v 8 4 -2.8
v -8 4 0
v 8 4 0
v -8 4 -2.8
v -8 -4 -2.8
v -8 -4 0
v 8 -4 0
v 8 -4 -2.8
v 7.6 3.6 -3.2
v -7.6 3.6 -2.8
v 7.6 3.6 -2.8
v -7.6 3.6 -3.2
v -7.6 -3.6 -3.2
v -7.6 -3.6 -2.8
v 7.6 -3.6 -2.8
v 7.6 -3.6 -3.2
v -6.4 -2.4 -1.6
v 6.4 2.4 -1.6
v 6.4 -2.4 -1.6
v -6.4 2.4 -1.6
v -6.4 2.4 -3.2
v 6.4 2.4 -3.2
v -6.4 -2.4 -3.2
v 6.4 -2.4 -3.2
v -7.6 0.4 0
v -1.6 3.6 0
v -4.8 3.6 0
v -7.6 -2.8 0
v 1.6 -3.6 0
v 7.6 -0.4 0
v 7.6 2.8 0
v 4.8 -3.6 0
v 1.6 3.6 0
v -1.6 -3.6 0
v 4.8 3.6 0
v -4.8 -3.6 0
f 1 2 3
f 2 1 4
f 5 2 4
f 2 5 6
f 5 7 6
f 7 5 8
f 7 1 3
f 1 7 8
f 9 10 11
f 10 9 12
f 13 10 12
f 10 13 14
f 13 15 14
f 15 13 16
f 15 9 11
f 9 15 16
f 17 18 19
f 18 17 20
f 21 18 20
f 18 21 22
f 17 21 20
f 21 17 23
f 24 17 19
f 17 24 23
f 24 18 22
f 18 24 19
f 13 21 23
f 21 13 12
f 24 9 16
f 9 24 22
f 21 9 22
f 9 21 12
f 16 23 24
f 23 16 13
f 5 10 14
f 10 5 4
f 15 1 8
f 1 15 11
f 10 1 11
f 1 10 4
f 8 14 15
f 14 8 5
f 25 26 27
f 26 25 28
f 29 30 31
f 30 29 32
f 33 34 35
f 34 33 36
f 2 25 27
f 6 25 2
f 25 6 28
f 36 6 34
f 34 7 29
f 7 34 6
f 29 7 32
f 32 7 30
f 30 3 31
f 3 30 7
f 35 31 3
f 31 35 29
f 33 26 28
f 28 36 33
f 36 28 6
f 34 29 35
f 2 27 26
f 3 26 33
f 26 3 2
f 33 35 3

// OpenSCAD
// file: ../p/4-4edge.scad
use <../lib.scad>
$fa=1; $fs=0.2;
function ldraw_lib__4_4edge(realsolid=false) = [
// 0 Circle 1.0
// 0 Name: 4-4edge.dat
// 0 Author: James Jessiman
// 0 !LDRAW_ORG Primitive UPDATE 2017-01
// 0 !LICENSE Licensed under CC BY 2.0 and CC BY 4.0 : see CAreadme.txt
// 
// 0 BFC CERTIFY CCW
  [0,"BFC","CERTIFY"],
  [0,"BFC","CCW"],
// 
// 0 !HISTORY 1998-12-15 [PTadmin] Official Update 1998-10
// 0 !HISTORY 2005-12-28 [PTadmin] Official Update 2005-01
// 0 !HISTORY 2007-06-24 [PTadmin] Header formatted for Contributor Agreement
// 0 !HISTORY 2008-07-01 [PTadmin] Official Update 2008-01
// 0 !HISTORY 2017-01-15 [Steffen] BFCed
// 0 !HISTORY 2017-12-30 [PTadmin] Official Update 2017-01
// 
// 
// 2 24 1 0 0 0.9239 0 0.3827
  [2,24,1,0,0,0.9239,0,0.3827],
// 2 24 0.9239 0 0.3827 0.7071 0 0.7071
  [2,24,0.9239,0,0.3827,0.7071,0,0.7071],
// 2 24 0.7071 0 0.7071 0.3827 0 0.9239
  [2,24,0.7071,0,0.7071,0.3827,0,0.9239],
// 2 24 0.3827 0 0.9239 0 0 1
  [2,24,0.3827,0,0.9239,0,0,1],
// 2 24 0 0 1 -0.3827 0 0.9239
  [2,24,0,0,1,-0.3827,0,0.9239],
// 2 24 -0.3827 0 0.9239 -0.7071 0 0.7071
  [2,24,-0.3827,0,0.9239,-0.7071,0,0.7071],
// 2 24 -0.7071 0 0.7071 -0.9239 0 0.3827
  [2,24,-0.7071,0,0.7071,-0.9239,0,0.3827],
// 2 24 -0.9239 0 0.3827 -1 0 -0
  [2,24,-0.9239,0,0.3827,-1,0,-0],
// 2 24 -1 0 -0 -0.9239 0 -0.3827
  [2,24,-1,0,-0,-0.9239,0,-0.3827],
// 2 24 -0.9239 0 -0.3827 -0.7071 0 -0.7071
  [2,24,-0.9239,0,-0.3827,-0.7071,0,-0.7071],
// 2 24 -0.7071 0 -0.7071 -0.3827 0 -0.9239
  [2,24,-0.7071,0,-0.7071,-0.3827,0,-0.9239],
// 2 24 -0.3827 0 -0.9239 0 0 -1
  [2,24,-0.3827,0,-0.9239,0,0,-1],
// 2 24 0 0 -1 0.3827 0 -0.9239
  [2,24,0,0,-1,0.3827,0,-0.9239],
// 2 24 0.3827 0 -0.9239 0.7071 0 -0.7071
  [2,24,0.3827,0,-0.9239,0.7071,0,-0.7071],
// 2 24 0.7071 0 -0.7071 0.9239 0 -0.3827
  [2,24,0.7071,0,-0.7071,0.9239,0,-0.3827],
// 2 24 0.9239 0 -0.3827 1 0 0
  [2,24,0.9239,0,-0.3827,1,0,0],
];
module ldraw_lib__4_4edge(step=0, col=false, unit=2/5, alt=false, line=0.2, solid=!$preview)
    makepoly(ldraw_lib__4_4edge(solid), step=step, col=col, unit=unit, alt=alt, line=line, solid=solid);
ldraw_lib__4_4edge(line=0.2);
// file: ../p/4-4disc.scad
use <../lib.scad>
$fa=1; $fs=0.2;
function ldraw_lib__4_4disc(realsolid=false) = [
// 0 Disc 1.0
// 0 Name: 4-4disc.dat
// 0 Author: James Jessiman
// 0 !LDRAW_ORG Primitive UPDATE 2002-02
// 0 !LICENSE Licensed under CC BY 2.0 and CC BY 4.0 : see CAreadme.txt
// 
// 0 BFC CERTIFY CCW
  [0,"BFC","CERTIFY"],
  [0,"BFC","CCW"],
// 
// 0 !HISTORY 1998-12-15 [PTadmin] Official Update 1998-10
// 0 !HISTORY 2002-03-23 [sbliss] Added BFC statement
// 0 !HISTORY 2002-04-25 [PTadmin] Official Update 2002-02
// 0 !HISTORY 2007-06-24 [PTadmin] Header formatted for Contributor Agreement
// 0 !HISTORY 2008-07-01 [PTadmin] Official Update 2008-01
// 
// 
// 3 16 0 0 0 1 0 0 0.9239 0 0.3827
  [3,16,0,0,0,1,0,0,0.9239,0,0.3827],
// 3 16 0 0 0 0.9239 0 0.3827 0.7071 0 0.7071
  [3,16,0,0,0,0.9239,0,0.3827,0.7071,0,0.7071],
// 3 16 0 0 0 0.7071 0 0.7071 0.3827 0 0.9239
  [3,16,0,0,0,0.7071,0,0.7071,0.3827,0,0.9239],
// 3 16 0 0 0 0.3827 0 0.9239 0 0 1
  [3,16,0,0,0,0.3827,0,0.9239,0,0,1],
// 3 16 0 0 0 0 0 1 -0.3827 0 0.9239
  [3,16,0,0,0,0,0,1,-0.3827,0,0.9239],
// 3 16 0 0 0 -0.3827 0 0.9239 -0.7071 0 0.7071
  [3,16,0,0,0,-0.3827,0,0.9239,-0.7071,0,0.7071],
// 3 16 0 0 0 -0.7071 0 0.7071 -0.9239 0 0.3827
  [3,16,0,0,0,-0.7071,0,0.7071,-0.9239,0,0.3827],
// 3 16 0 0 0 -0.9239 0 0.3827 -1 0 -0
  [3,16,0,0,0,-0.9239,0,0.3827,-1,0,-0],
// 3 16 0 0 0 -1 0 -0 -0.9239 0 -0.3827
  [3,16,0,0,0,-1,0,-0,-0.9239,0,-0.3827],
// 3 16 0 0 0 -0.9239 0 -0.3827 -0.7071 0 -0.7071
  [3,16,0,0,0,-0.9239,0,-0.3827,-0.7071,0,-0.7071],
// 3 16 0 0 0 -0.7071 0 -0.7071 -0.3827 0 -0.9239
  [3,16,0,0,0,-0.7071,0,-0.7071,-0.3827,0,-0.9239],
// 3 16 0 0 0 -0.3827 0 -0.9239 0 0 -1
  [3,16,0,0,0,-0.3827,0,-0.9239,0,0,-1],
// 3 16 0 0 0 0 0 -1 0.3827 0 -0.9239
  [3,16,0,0,0,0,0,-1,0.3827,0,-0.9239],
// 3 16 0 0 0 0.3827 0 -0.9239 0.7071 0 -0.7071
  [3,16,0,0,0,0.3827,0,-0.9239,0.7071,0,-0.7071],
// 3 16 0 0 0 0.7071 0 -0.7071 0.9239 0 -0.3827
  [3,16,0,0,0,0.7071,0,-0.7071,0.9239,0,-0.3827],
// 3 16 0 0 0 0.9239 0 -0.3827 1 0 0
  [3,16,0,0,0,0.9239,0,-0.3827,1,0,0],
// 0
];
module ldraw_lib__4_4disc(step=0, col=false, unit=2/5, alt=false, line=0.2, solid=!$preview)
    makepoly(ldraw_lib__4_4disc(solid), step=step, col=col, unit=unit, alt=alt, line=line, solid=solid);
ldraw_lib__4_4disc(line=0.2);
// file: ../p/4-4cyli.scad
use <../lib.scad>
$fa=1; $fs=0.2;
function ldraw_lib__4_4cyli(realsolid=false) = [
// 0 Cylinder 1.0
// 0 Name: 4-4cyli.dat
// 0 Author: James Jessiman
// 0 !LDRAW_ORG Primitive UPDATE 2005-01
// 0 !LICENSE Licensed under CC BY 2.0 and CC BY 4.0 : see CAreadme.txt
// 
// 0 BFC CERTIFY CCW
  [0,"BFC","CERTIFY"],
  [0,"BFC","CCW"],
// 
// 0 !HISTORY 1998-12-15 [PTadmin] Official Update 1998-10
// 0 !HISTORY 2002-03-23 [sbliss] Added BFC statement; merged headers from files in distributions LDraw 0.27 and Complete.
// 0 !HISTORY 2002-04-25 [PTadmin] Official Update 2002-02
// 0 !HISTORY 2004-12-14 [guyvivan] BFC CCW
// 0 !HISTORY 2005-12-28 [PTadmin] Official Update 2005-01
// 0 !HISTORY 2007-06-24 [PTadmin] Header formatted for Contributor Agreement
// 0 !HISTORY 2008-07-01 [PTadmin] Official Update 2008-01
// 
// 
// 4 16 1 1 0 0.9239 1 0.3827 0.9239 0 0.3827 1 0 0
  [4,16,1,1,0,0.9239,1,0.3827,0.9239,0,0.3827,1,0,0],
// 5 24 1 0 0 1 1 0 0.9239 0 0.3827 0.9239 0 -0.3827
  [5,24,1,0,0,1,1,0,0.9239,0,0.3827,0.9239,0,-0.3827],
// 4 16 0.9239 1 0.3827 0.7071 1 0.7071 0.7071 0 0.7071 0.9239 0 0.3827
  [4,16,0.9239,1,0.3827,0.7071,1,0.7071,0.7071,0,0.7071,0.9239,0,0.3827],
// 5 24 0.9239 0 0.3827 0.9239 1 0.3827 0.7071 0 0.7071 1 0 0
  [5,24,0.9239,0,0.3827,0.9239,1,0.3827,0.7071,0,0.7071,1,0,0],
// 4 16 0.7071 1 0.7071 0.3827 1 0.9239 0.3827 0 0.9239 0.7071 0 0.7071
  [4,16,0.7071,1,0.7071,0.3827,1,0.9239,0.3827,0,0.9239,0.7071,0,0.7071],
// 5 24 0.7071 0 0.7071 0.7071 1 0.7071 0.3827 0 0.9239 0.9239 0 0.3827
  [5,24,0.7071,0,0.7071,0.7071,1,0.7071,0.3827,0,0.9239,0.9239,0,0.3827],
// 4 16 0.3827 1 0.9239 0 1 1 0 0 1 0.3827 0 0.9239
  [4,16,0.3827,1,0.9239,0,1,1,0,0,1,0.3827,0,0.9239],
// 5 24 0.3827 0 0.9239 0.3827 1 0.9239 0 0 1 0.7071 0 0.7071
  [5,24,0.3827,0,0.9239,0.3827,1,0.9239,0,0,1,0.7071,0,0.7071],
// 4 16 0 1 1 -0.3827 1 0.9239 -0.3827 0 0.9239 0 0 1
  [4,16,0,1,1,-0.3827,1,0.9239,-0.3827,0,0.9239,0,0,1],
// 5 24 0 0 1 0 1 1 -0.3827 0 0.9239 0.3827 0 0.9239
  [5,24,0,0,1,0,1,1,-0.3827,0,0.9239,0.3827,0,0.9239],
// 4 16 -0.3827 1 0.9239 -0.7071 1 0.7071 -0.7071 0 0.7071 -0.3827 0 0.9239
  [4,16,-0.3827,1,0.9239,-0.7071,1,0.7071,-0.7071,0,0.7071,-0.3827,0,0.9239],
// 5 24 -0.3827 0 0.9239 -0.3827 1 0.9239 -0.7071 0 0.7071 0 0 1
  [5,24,-0.3827,0,0.9239,-0.3827,1,0.9239,-0.7071,0,0.7071,0,0,1],
// 4 16 -0.7071 1 0.7071 -0.9239 1 0.3827 -0.9239 0 0.3827 -0.7071 0 0.7071
  [4,16,-0.7071,1,0.7071,-0.9239,1,0.3827,-0.9239,0,0.3827,-0.7071,0,0.7071],
// 5 24 -0.7071 0 0.7071 -0.7071 1 0.7071 -0.9239 0 0.3827 -0.3827 0 0.9239
  [5,24,-0.7071,0,0.7071,-0.7071,1,0.7071,-0.9239,0,0.3827,-0.3827,0,0.9239],
// 4 16 -0.9239 1 0.3827 -1 1 0 -1 0 0 -0.9239 0 0.3827
  [4,16,-0.9239,1,0.3827,-1,1,0,-1,0,0,-0.9239,0,0.3827],
// 5 24 -0.9239 0 0.3827 -0.9239 1 0.3827 -1 0 0 -0.7071 0 0.7071
  [5,24,-0.9239,0,0.3827,-0.9239,1,0.3827,-1,0,0,-0.7071,0,0.7071],
// 4 16 -1 1 0 -0.9239 1 -0.3827 -0.9239 0 -0.3827 -1 0 0
  [4,16,-1,1,0,-0.9239,1,-0.3827,-0.9239,0,-0.3827,-1,0,0],
// 5 24 -1 0 0 -1 1 0 -0.9239 0 -0.3827 -0.9239 0 0.3827
  [5,24,-1,0,0,-1,1,0,-0.9239,0,-0.3827,-0.9239,0,0.3827],
// 4 16 -0.9239 1 -0.3827 -0.7071 1 -0.7071 -0.7071 0 -0.7071 -0.9239 0 -0.3827
  [4,16,-0.9239,1,-0.3827,-0.7071,1,-0.7071,-0.7071,0,-0.7071,-0.9239,0,-0.3827],
// 5 24 -0.9239 0 -0.3827 -0.9239 1 -0.3827 -0.7071 0 -0.7071 -1 0 0
  [5,24,-0.9239,0,-0.3827,-0.9239,1,-0.3827,-0.7071,0,-0.7071,-1,0,0],
// 4 16 -0.7071 1 -0.7071 -0.3827 1 -0.9239 -0.3827 0 -0.9239 -0.7071 0 -0.7071
  [4,16,-0.7071,1,-0.7071,-0.3827,1,-0.9239,-0.3827,0,-0.9239,-0.7071,0,-0.7071],
// 5 24 -0.7071 0 -0.7071 -0.7071 1 -0.7071 -0.3827 0 -0.9239 -0.9239 0 -0.3827
  [5,24,-0.7071,0,-0.7071,-0.7071,1,-0.7071,-0.3827,0,-0.9239,-0.9239,0,-0.3827],
// 4 16 -0.3827 1 -0.9239 0 1 -1 0 0 -1 -0.3827 0 -0.9239
  [4,16,-0.3827,1,-0.9239,0,1,-1,0,0,-1,-0.3827,0,-0.9239],
// 5 24 -0.3827 0 -0.9239 -0.3827 1 -0.9239 0 0 -1 -0.7071 0 -0.7071
  [5,24,-0.3827,0,-0.9239,-0.3827,1,-0.9239,0,0,-1,-0.7071,0,-0.7071],
// 4 16 0 1 -1 0.3827 1 -0.9239 0.3827 0 -0.9239 0 0 -1
  [4,16,0,1,-1,0.3827,1,-0.9239,0.3827,0,-0.9239,0,0,-1],
// 5 24 0 0 -1 0 1 -1 0.3827 0 -0.9239 -0.3827 0 -0.9239
  [5,24,0,0,-1,0,1,-1,0.3827,0,-0.9239,-0.3827,0,-0.9239],
// 4 16 0.3827 1 -0.9239 0.7071 1 -0.7071 0.7071 0 -0.7071 0.3827 0 -0.9239
  [4,16,0.3827,1,-0.9239,0.7071,1,-0.7071,0.7071,0,-0.7071,0.3827,0,-0.9239],
// 5 24 0.3827 0 -0.9239 0.3827 1 -0.9239 0.7071 0 -0.7071 0 0 -1
  [5,24,0.3827,0,-0.9239,0.3827,1,-0.9239,0.7071,0,-0.7071,0,0,-1],
// 4 16 0.7071 1 -0.7071 0.9239 1 -0.3827 0.9239 0 -0.3827 0.7071 0 -0.7071
  [4,16,0.7071,1,-0.7071,0.9239,1,-0.3827,0.9239,0,-0.3827,0.7071,0,-0.7071],
// 5 24 0.7071 0 -0.7071 0.7071 1 -0.7071 0.9239 0 -0.3827 0.3827 0 -0.9239
  [5,24,0.7071,0,-0.7071,0.7071,1,-0.7071,0.9239,0,-0.3827,0.3827,0,-0.9239],
// 4 16 0.9239 1 -0.3827 1 1 0 1 0 0 0.9239 0 -0.3827
  [4,16,0.9239,1,-0.3827,1,1,0,1,0,0,0.9239,0,-0.3827],
// 5 24 0.9239 0 -0.3827 0.9239 1 -0.3827 1 0 0 0.7071 0 -0.7071
  [5,24,0.9239,0,-0.3827,0.9239,1,-0.3827,1,0,0,0.7071,0,-0.7071],
// 0
];
module ldraw_lib__4_4cyli(step=0, col=false, unit=2/5, alt=false, line=0.2, solid=!$preview)
    makepoly(ldraw_lib__4_4cyli(solid), step=step, col=col, unit=unit, alt=alt, line=line, solid=solid);
ldraw_lib__4_4cyli(line=0.2);
// file: ../p/stud3.scad
use <../lib.scad>
use <4-4cyli.scad>
use <4-4disc.scad>
use <4-4edge.scad>
$fa=1; $fs=0.2;
function ldraw_lib__stud3(realsolid=false) = realsolid ? 
    [openscad(translate([0,0,-eps()], o=cylinder(4+eps(), r=4)),2)] : [
// 0 Stud Tube Solid
// 0 Name: stud3.dat
// 0 Author: James Jessiman
// 0 !LDRAW_ORG Primitive UPDATE 2012-01
// 0 !LICENSE Licensed under CC BY 2.0 and CC BY 4.0 : see CAreadme.txt
// 
// 0 BFC CERTIFY CCW
  [0,"BFC","CERTIFY"],
  [0,"BFC","CCW"],
// 
// 0 !HISTORY 2002-04-04 [sbliss] Modified for BFC compliance
// 0 !HISTORY 2002-04-25 [PTadmin] Official Update 2002-02
// 0 !HISTORY 2007-06-24 [PTadmin] Header formatted for Contributor Agreement
// 0 !HISTORY 2008-07-01 [PTadmin] Official Update 2008-01
// 0 !HISTORY 2012-02-16 [Philo] Changed to CCW
// 0 !HISTORY 2012-03-30 [PTadmin] Official Update 2012-01
// 
// 
// 1 16 0 -4 0 4 0 0 0 1 0 0 0 4 4-4edge.dat
  [1,16,0,-4,0,4,0,0,0,1,0,0,0,4, ldraw_lib__4_4edge(realsolid)],
// 1 16 0 0 0 4 0 0 0 1 0 0 0 4 4-4edge.dat
  [1,16,0,0,0,4,0,0,0,1,0,0,0,4, ldraw_lib__4_4edge(realsolid)],
// 1 16 0 -4 0 4 0 0 0 1 0 0 0 4 4-4disc.dat
  [1,16,0,-4,0,4,0,0,0,1,0,0,0,4, ldraw_lib__4_4disc(realsolid)],
// 1 16 0 -4 0 4 0 0 0 4 0 0 0 4 4-4cyli.dat
  [1,16,0,-4,0,4,0,0,0,4,0,0,0,4, ldraw_lib__4_4cyli(realsolid)],
];
module ldraw_lib__stud3(step=0, col=false, unit=2/5, alt=false, line=0.2, solid=!$preview)
    makepoly(ldraw_lib__stud3(solid), step=step, col=col, unit=unit, alt=alt, line=line, solid=solid);
ldraw_lib__stud3(line=0.2);
// file: ../p/stud.scad
use <../lib.scad>
use <4-4cyli.scad>
use <4-4disc.scad>
use <4-4edge.scad>
$fa=1; $fs=0.2;
function ldraw_lib__stud(realsolid=false) = realsolid ? 
    [openscad(translate([0,0,-eps()], o=cylinder(4+eps(), r=6)),2)] : [
// 0 Stud
// 0 Name: stud.dat
// 0 Author: James Jessiman
// 0 !LDRAW_ORG Primitive UPDATE 2012-01
// 0 !LICENSE Licensed under CC BY 2.0 and CC BY 4.0 : see CAreadme.txt
// 
// 0 BFC CERTIFY CCW
  [0,"BFC","CERTIFY"],
  [0,"BFC","CCW"],
// 
// 0 !HISTORY 2002-04-04 [sbliss] Modified for BFC compliance
// 0 !HISTORY 2002-04-25 [PTadmin] Official Update 2002-02
// 0 !HISTORY 2007-06-24 [PTadmin] Header formatted for Contributor Agreement
// 0 !HISTORY 2008-07-01 [PTadmin] Official Update 2008-01
// 0 !HISTORY 2012-02-16 [Philo] Changed to CCW
// 0 !HISTORY 2012-03-30 [PTadmin] Official Update 2012-01
// 
// 
// 1 16 0 0 0 6 0 0 0 1 0 0 0 6 4-4edge.dat
  [1,16,0,0,0,6,0,0,0,1,0,0,0,6, ldraw_lib__4_4edge(realsolid)],
// 1 16 0 -4 0 6 0 0 0 1 0 0 0 6 4-4edge.dat
  [1,16,0,-4,0,6,0,0,0,1,0,0,0,6, ldraw_lib__4_4edge(realsolid)],
// 1 16 0 0 0 6 0 0 0 -4 0 0 0 6 4-4cyli.dat
  [1,16,0,0,0,6,0,0,0,-4,0,0,0,6, ldraw_lib__4_4cyli(realsolid)],
// 1 16 0 -4 0 6 0 0 0 1 0 0 0 6 4-4disc.dat
  [1,16,0,-4,0,6,0,0,0,1,0,0,0,6, ldraw_lib__4_4disc(realsolid)],
];
module ldraw_lib__stud(step=0, col=false, unit=2/5, alt=false, line=0.2, solid=!$preview)
    makepoly(ldraw_lib__stud(solid), step=step, col=col, unit=unit, alt=alt, line=line, solid=solid);
ldraw_lib__stud(line=0.2);
// file: ../p/box4t.scad
use <../lib.scad>
$fa=1; $fs=0.2;
function ldraw_lib__box4t(realsolid=false) = [
// 0 Box with 4 Adjacent Faces and All Edges
// 0 Name: box4t.dat
// 0 Author: Tore Eriksson [Tore_Eriksson]
// 0 !LDRAW_ORG Primitive UPDATE 2003-02
// 0 !LICENSE Licensed under CC BY 2.0 and CC BY 4.0 : see CAreadme.txt
// 
// 0 BFC CERTIFY CCW
  [0,"BFC","CERTIFY"],
  [0,"BFC","CCW"],
// 
// 0 !HISTORY 1997-09-29 [PTadmin] Official Update 1997-15
// 0 !HISTORY 2002-08-31 [izanette] Modified with WINDZ for BFC compliance
// 0 !HISTORY 2003-08-01 [PTadmin] Official Update 2003-02
// 0 !HISTORY 2007-06-24 [PTadmin] Header formatted for Contributor Agreement
// 0 !HISTORY 2008-07-01 [PTadmin] Official Update 2008-01
// 
// 
// 2 24 1 1 1 -1 1 1
  [2,24,1,1,1,-1,1,1],
// 2 24 -1 1 1 -1 1 -1
  [2,24,-1,1,1,-1,1,-1],
// 2 24 -1 1 -1 1 1 -1
  [2,24,-1,1,-1,1,1,-1],
// 2 24 1 1 -1 1 1 1
  [2,24,1,1,-1,1,1,1],
// 2 24 1 0 1 -1 0 1
  [2,24,1,0,1,-1,0,1],
// 2 24 -1 0 1 -1 0 -1
  [2,24,-1,0,1,-1,0,-1],
// 2 24 -1 0 -1 1 0 -1
  [2,24,-1,0,-1,1,0,-1],
// 2 24 1 0 -1 1 0 1
  [2,24,1,0,-1,1,0,1],
// 2 24 1 0 1 1 1 1
  [2,24,1,0,1,1,1,1],
// 2 24 -1 0 1 -1 1 1
  [2,24,-1,0,1,-1,1,1],
// 2 24 1 0 -1 1 1 -1
  [2,24,1,0,-1,1,1,-1],
// 2 24 -1 0 -1 -1 1 -1
  [2,24,-1,0,-1,-1,1,-1],
// 4 16 1 1 1 1 1 -1 -1 1 -1 -1 1 1
  [4,16,1,1,1,1,1,-1,-1,1,-1,-1,1,1],
// 4 16 1 1 1 -1 1 1 -1 0 1 1 0 1
  [4,16,1,1,1,-1,1,1,-1,0,1,1,0,1],
// 4 16 -1 1 1 -1 1 -1 -1 0 -1 -1 0 1
  [4,16,-1,1,1,-1,1,-1,-1,0,-1,-1,0,1],
// 0 4 16 -1 1 -1 -1 0 -1 1 0 -1 1 1 -1
// 4 16 1 1 -1 1 1 1 1 0 1 1 0 -1
  [4,16,1,1,-1,1,1,1,1,0,1,1,0,-1],
// 0
];
module ldraw_lib__box4t(step=0, col=false, unit=2/5, alt=false, line=0.2, solid=!$preview)
    makepoly(ldraw_lib__box4t(solid), step=step, col=col, unit=unit, alt=alt, line=line, solid=solid);
ldraw_lib__box4t(line=0.2);
// file: s/3004s01.scad
use <../../lib.scad>
use <../../p/box4t.scad>
use <../../p/box5.scad>
use <../../p/stud.scad>
use <../../p/stud3.scad>
$fa=1; $fs=0.2;
function ldraw_lib__s__3004s01(realsolid=false) = [
// 0 ~Brick  1 x  2 without Front Face
// 0 Name: s\3004s01.dat
// 0 Author: James Jessiman
// 0 !LDRAW_ORG Subpart UPDATE 2003-03
// 0 !LICENSE Licensed under CC BY 2.0 and CC BY 4.0 : see CAreadme.txt
// 
// 0 BFC CERTIFY CCW
  [0,"BFC","CERTIFY"],
  [0,"BFC","CCW"],
// 
// 0 !HISTORY 2003-09-07 [jriley] Subfiling, BFC
// 0 !HISTORY 2003-12-19 [PTadmin] Official Update 2003-03
// 0 !HISTORY 2007-08-29 [PTadmin] Header formatted for Contributor Agreement
// 0 !HISTORY 2008-07-01 [PTadmin] Official Update 2008-01
// 
// 
// 1 16 0 4 0 1 0 0 0 -5 0 0 0 1 stud3.dat
  [1,16,0,4,0,1,0,0,0,-5,0,0,0,1, ldraw_lib__stud3(realsolid)],
// 0 BFC INVERTNEXT
  [0,"BFC","INVERTNEXT"],
// 1 16 0 24 0 16 0 0 0 -20 0 0 0 6 box5.dat
  [1,16,0,24,0,16,0,0,0,-20,0,0,0,6, ldraw_lib__box5(realsolid)],
// 4 16 20 24 10 16 24 6 -16 24 6 -20 24 10
  [4,16,20,24,10,16,24,6,-16,24,6,-20,24,10],
// 4 16 -20 24 10 -16 24 6 -16 24 -6 -20 24 -10
  [4,16,-20,24,10,-16,24,6,-16,24,-6,-20,24,-10],
// 4 16 -20 24 -10 -16 24 -6 16 24 -6 20 24 -10
  [4,16,-20,24,-10,-16,24,-6,16,24,-6,20,24,-10],
// 4 16 20 24 -10 16 24 -6 16 24 6 20 24 10
  [4,16,20,24,-10,16,24,-6,16,24,6,20,24,10],
// 1 16 0 24 0 20 0 0 0 -24 0 0 0 10 box4t.dat
  [1,16,0,24,0,20,0,0,0,-24,0,0,0,10, ldraw_lib__box4t(realsolid)],
// 1 16 10 0 0 1 0 0 0 1 0 0 0 1 stud.dat
  [1,16,10,0,0,1,0,0,0,1,0,0,0,1, ldraw_lib__stud(realsolid)],
// 1 16 -10 0 0 1 0 0 0 1 0 0 0 1 stud.dat
  [1,16,-10,0,0,1,0,0,0,1,0,0,0,1, ldraw_lib__stud(realsolid)],
// 0
];
module ldraw_lib__s__3004s01(step=0, col=false, unit=2/5, alt=false, line=0.2, solid=!$preview)
    makepoly(ldraw_lib__s__3004s01(solid), step=step, col=col, unit=unit, alt=alt, line=line, solid=solid);
ldraw_lib__s__3004s01(line=0.2);
// file: ../p/box5.scad
use <../lib.scad>
$fa=1; $fs=0.2;
function ldraw_lib__box5(realsolid=false) = [
// 0 Box with 5 Faces and All Edges
// 0 Name: box5.dat
// 0 Author: James Jessiman
// 0 !LDRAW_ORG Primitive UPDATE 2012-01
// 0 !LICENSE Licensed under CC BY 2.0 and CC BY 4.0 : see CAreadme.txt
// 
// 0 BFC CERTIFY CCW
  [0,"BFC","CERTIFY"],
  [0,"BFC","CCW"],
// 
// 0 !HISTORY 2002-04-03 [sbliss] Modified for BFC compliance
// 0 !HISTORY 2002-04-25 [PTadmin] Official Update 2002-02
// 0 !HISTORY 2007-06-24 [PTadmin] Header formatted for Contributor Agreement
// 0 !HISTORY 2008-07-01 [PTadmin] Official Update 2008-01
// 0 !HISTORY 2012-02-16 [Philo] Changed to CCW
// 0 !HISTORY 2012-03-30 [PTadmin] Official Update 2012-01
// 
// 
// 2 24 1 1 1 -1 1 1
  [2,24,1,1,1,-1,1,1],
// 2 24 -1 1 1 -1 1 -1
  [2,24,-1,1,1,-1,1,-1],
// 2 24 -1 1 -1 1 1 -1
  [2,24,-1,1,-1,1,1,-1],
// 2 24 1 1 -1 1 1 1
  [2,24,1,1,-1,1,1,1],
// 2 24 1 0 1 -1 0 1
  [2,24,1,0,1,-1,0,1],
// 2 24 -1 0 1 -1 0 -1
  [2,24,-1,0,1,-1,0,-1],
// 2 24 -1 0 -1 1 0 -1
  [2,24,-1,0,-1,1,0,-1],
// 2 24 1 0 -1 1 0 1
  [2,24,1,0,-1,1,0,1],
// 2 24 1 0 1 1 1 1
  [2,24,1,0,1,1,1,1],
// 2 24 -1 0 1 -1 1 1
  [2,24,-1,0,1,-1,1,1],
// 2 24 1 0 -1 1 1 -1
  [2,24,1,0,-1,1,1,-1],
// 2 24 -1 0 -1 -1 1 -1
  [2,24,-1,0,-1,-1,1,-1],
// 4 16 -1 1 1 1 1 1 1 1 -1 -1 1 -1
  [4,16,-1,1,1,1,1,1,1,1,-1,-1,1,-1],
// 4 16 -1 1 1 -1 0 1 1 0 1 1 1 1
  [4,16,-1,1,1,-1,0,1,1,0,1,1,1,1],
// 4 16 -1 1 -1 -1 0 -1 -1 0 1 -1 1 1
  [4,16,-1,1,-1,-1,0,-1,-1,0,1,-1,1,1],
// 4 16 1 1 -1 1 0 -1 -1 0 -1 -1 1 -1
  [4,16,1,1,-1,1,0,-1,-1,0,-1,-1,1,-1],
// 4 16 1 1 1 1 0 1 1 0 -1 1 1 -1
  [4,16,1,1,1,1,0,1,1,0,-1,1,1,-1],
];
module ldraw_lib__box5(step=0, col=false, unit=2/5, alt=false, line=0.2, solid=!$preview)
    makepoly(ldraw_lib__box5(solid), step=step, col=col, unit=unit, alt=alt, line=line, solid=solid);
ldraw_lib__box5(line=0.2);
// file: ../p/box4.scad
use <../lib.scad>
$fa=1; $fs=0.2;
function ldraw_lib__box4(realsolid=false) = [
// 0 Box with 4 Faces (2 Parallel Pairs) and All Edges
// 0 Name: box4.dat
// 0 Author: James Jessiman
// 0 !LDRAW_ORG Primitive UPDATE 2012-01
// 0 !LICENSE Licensed under CC BY 2.0 and CC BY 4.0 : see CAreadme.txt
// 
// 0 BFC CERTIFY CCW
  [0,"BFC","CERTIFY"],
  [0,"BFC","CCW"],
// 
// 0 !HISTORY 2002-04-03 [sbliss] Modified for BFC compliance
// 0 !HISTORY 2002-04-25 [PTadmin] Official Update 2002-02
// 0 !HISTORY 2007-06-24 [PTadmin] Header formatted for Contributor Agreement
// 0 !HISTORY 2008-07-01 [PTadmin] Official Update 2008-01
// 0 !HISTORY 2012-02-16 [Philo] Changed to CCW
// 0 !HISTORY 2012-03-30 [PTadmin] Official Update 2012-01
// 
// 
// 2 24 1 1 1 -1 1 1
  [2,24,1,1,1,-1,1,1],
// 2 24 -1 1 1 -1 1 -1
  [2,24,-1,1,1,-1,1,-1],
// 2 24 -1 1 -1 1 1 -1
  [2,24,-1,1,-1,1,1,-1],
// 2 24 1 1 -1 1 1 1
  [2,24,1,1,-1,1,1,1],
// 2 24 1 0 1 -1 0 1
  [2,24,1,0,1,-1,0,1],
// 2 24 -1 0 1 -1 0 -1
  [2,24,-1,0,1,-1,0,-1],
// 2 24 -1 0 -1 1 0 -1
  [2,24,-1,0,-1,1,0,-1],
// 2 24 1 0 -1 1 0 1
  [2,24,1,0,-1,1,0,1],
// 2 24 1 0 1 1 1 1
  [2,24,1,0,1,1,1,1],
// 2 24 -1 0 1 -1 1 1
  [2,24,-1,0,1,-1,1,1],
// 2 24 1 0 -1 1 1 -1
  [2,24,1,0,-1,1,1,-1],
// 2 24 -1 0 -1 -1 1 -1
  [2,24,-1,0,-1,-1,1,-1],
// 4 16 -1 1 1 -1 0 1 1 0 1 1 1 1
  [4,16,-1,1,1,-1,0,1,1,0,1,1,1,1],
// 4 16 -1 1 -1 -1 0 -1 -1 0 1 -1 1 1
  [4,16,-1,1,-1,-1,0,-1,-1,0,1,-1,1,1],
// 4 16 1 1 -1 1 0 -1 -1 0 -1 -1 1 -1
  [4,16,1,1,-1,1,0,-1,-1,0,-1,-1,1,-1],
// 4 16 1 1 1 1 0 1 1 0 -1 1 1 -1
  [4,16,1,1,1,1,0,1,1,0,-1,1,1,-1],
];
module ldraw_lib__box4(step=0, col=false, unit=2/5, alt=false, line=0.2, solid=!$preview)
    makepoly(ldraw_lib__box4(solid), step=step, col=col, unit=unit, alt=alt, line=line, solid=solid);
ldraw_lib__box4(line=0.2);
// file: 3004.scad
use <../lib.scad>
use <s/3004s01.scad>
$fa=1; $fs=0.2;
function ldraw_lib__3004(realsolid=false) = [
// 0 Brick  1 x  2
// 0 Name: 3004.dat
// 0 Author: James Jessiman
// 0 !LDRAW_ORG Part UPDATE 2022-05
// 0 !LICENSE Licensed under CC BY 2.0 and CC BY 4.0 : see CAreadme.txt
// 
// 0 BFC CERTIFY CCW
  [0,"BFC","CERTIFY"],
  [0,"BFC","CCW"],
// 
// 0 !HISTORY 2001-10-26 [PTadmin] Official Update 2001-01
// 0 !HISTORY 2002-05-07 {unknown} BFC Certification
// 0 !HISTORY 2002-06-11 [PTadmin] Official Update 2002-03
// 0 !HISTORY 2007-05-07 [PTadmin] Header formatted for Contributor Agreement
// 0 !HISTORY 2008-07-01 [PTadmin] Official Update 2008-01
// 0 !HISTORY 2022-08-04 [MagFors] Using subfile
// 0 !HISTORY 2022-09-15 [PTadmin] Official Update 2022-05
// 
// 
// 1 16 0 0 0 1 0 0 0 1 0 0 0 1 s\3004s01.dat
  [1,16,0,0,0,1,0,0,0,1,0,0,0,1, ldraw_lib__s__3004s01(realsolid)],
// 4 16 -20 24 -10 20 24 -10 20 0 -10 -20 0 -10
  [4,16,-20,24,-10,20,24,-10,20,0,-10,-20,0,-10],
];
module ldraw_lib__3004(step=0, col=false, unit=2/5, alt=false, line=0.2, solid=!$preview)
    makepoly(ldraw_lib__3004(solid), step=step, col=col, unit=unit, alt=alt, line=line, solid=solid);
ldraw_lib__3004(line=0.2);
// file: s/3069bs01.scad
use <../../lib.scad>
use <../../p/box4.scad>
use <../../p/box5.scad>
$fa=1; $fs=0.2;
function ldraw_lib__s__3069bs01(realsolid=false) = [
// 0 ~Tile  1 x  2 with Groove without Top Face
// 0 Name: s\3069bs01.dat
// 0 Author: Santeri Piippo [arezey]
// 0 !LDRAW_ORG Subpart UPDATE 2010-02
// 0 !LICENSE Licensed under CC BY 2.0 and CC BY 4.0 : see CAreadme.txt
// 
// 0 BFC CERTIFY CCW
  [0,"BFC","CERTIFY"],
  [0,"BFC","CCW"],
// 
// 0 !HISTORY 2010-07-05 [PTadmin] Official Update 2010-02
// 
// 
// 1 16 0 0 0 20 0 0 0 7 0 0 0 10 box4.dat
  [1,16,0,0,0,20,0,0,0,7,0,0,0,10, ldraw_lib__box4(realsolid)],
// 1 16 0 7 0 19 0 0 0 1 0 0 0 9 box4.dat
  [1,16,0,7,0,19,0,0,0,1,0,0,0,9, ldraw_lib__box4(realsolid)],
// 0 BFC INVERTNEXT
  [0,"BFC","INVERTNEXT"],
// 1 16 0 8 0 16 0 0 0 -4 0 0 0 6 box5.dat
  [1,16,0,8,0,16,0,0,0,-4,0,0,0,6, ldraw_lib__box5(realsolid)],
// 4 16 -19 8 9 -16 8 6 -16 8 -6 -19 8 -9
  [4,16,-19,8,9,-16,8,6,-16,8,-6,-19,8,-9],
// 4 16 19 8 -9 16 8 -6 16 8 6 19 8 9
  [4,16,19,8,-9,16,8,-6,16,8,6,19,8,9],
// 4 16 19 8 9 16 8 6 -16 8 6 -19 8 9
  [4,16,19,8,9,16,8,6,-16,8,6,-19,8,9],
// 4 16 -19 8 -9 -16 8 -6 16 8 -6 19 8 -9
  [4,16,-19,8,-9,-16,8,-6,16,8,-6,19,8,-9],
// 4 16 -20 7 10 -19 7 9 -19 7 -9 -20 7 -10
  [4,16,-20,7,10,-19,7,9,-19,7,-9,-20,7,-10],
// 4 16 20 7 -10 19 7 -9 19 7 9 20 7 10
  [4,16,20,7,-10,19,7,-9,19,7,9,20,7,10],
// 4 16 20 7 10 19 7 9 -19 7 9 -20 7 10
  [4,16,20,7,10,19,7,9,-19,7,9,-20,7,10],
// 4 16 -20 7 -10 -19 7 -9 19 7 -9 20 7 -10
  [4,16,-20,7,-10,-19,7,-9,19,7,-9,20,7,-10],
// 0 //
];
module ldraw_lib__s__3069bs01(step=0, col=false, unit=2/5, alt=false, line=0.2, solid=!$preview)
    makepoly(ldraw_lib__s__3069bs01(solid), step=step, col=col, unit=unit, alt=alt, line=line, solid=solid);
ldraw_lib__s__3069bs01(line=0.2);
// main file
use <../lib.scad>
use <s/3069bs01.scad>
$fa=1; $fs=0.2;
function ldraw_lib__3069bp0i(realsolid=false) = [
// 0 Tile  1 x  2 with  3 Black Diagonal Stripes Pattern
// 0 Name: 3069bp0i.dat
// 0 Author: Vincent Messenet [Cheenzo]
// 0 !LDRAW_ORG Part UPDATE 2019-03
// 0 !LICENSE Licensed under CC BY 2.0 and CC BY 4.0 : see CAreadme.txt
// 
// 0 BFC CERTIFY CCW
  [0,"BFC","CERTIFY"],
  [0,"BFC","CCW"],
// 
// 0 !KEYWORDS BrickLink 3069bpb436
// 
// 0 !HISTORY 2019-12-27 [PTadmin] Official Update 2019-03
// 
// 
// 1 16 0 0 0 1 0 0 0 1 0 0 0 1 s\3069bs01.dat
  [1,16,0,0,0,1,0,0,0,1,0,0,0,1, ldraw_lib__s__3069bs01(realsolid)],
// 
// 4 0 -4 0 9 -12 0 9 -19 0 1 -19 0 -7
  [4,0,-4,0,9,-12,0,9,-19,0,1,-19,0,-7],
// 4 0 4 0 -9 12 0 -9 19 0 -1 19 0 7
  [4,0,4,0,-9,12,0,-9,19,0,-1,19,0,7],
// 4 0 -12 0 -9 -4 0 -9 12 0 9 4 0 9
  [4,0,-12,0,-9,-4,0,-9,12,0,9,4,0,9],
// 3 16 -20 0 10 -19 0 1 -12 0 9
  [3,16,-20,0,10,-19,0,1,-12,0,9],
// 4 16 -20 0 -10 -19 0 -7 -19 0 1 -20 0 10
  [4,16,-20,0,-10,-19,0,-7,-19,0,1,-20,0,10],
// 3 16 -12 0 -9 -20 0 -10 -4 0 -9
  [3,16,-12,0,-9,-20,0,-10,-4,0,-9],
// 4 16 20 0 -10 4 0 -9 -4 0 -9 -20 0 -10
  [4,16,20,0,-10,4,0,-9,-4,0,-9,-20,0,-10],
// 3 16 4 0 -9 20 0 -10 12 0 -9
  [3,16,4,0,-9,20,0,-10,12,0,-9],
// 3 16 12 0 -9 20 0 -10 19 0 -1
  [3,16,12,0,-9,20,0,-10,19,0,-1],
// 4 16 19 0 7 19 0 -1 20 0 -10 20 0 10
  [4,16,19,0,7,19,0,-1,20,0,-10,20,0,10],
// 4 16 4 0 -9 19 0 7 20 0 10 12 0 9
  [4,16,4,0,-9,19,0,7,20,0,10,12,0,9],
// 3 16 4 0 9 -4 0 9 -19 0 -7
  [3,16,4,0,9,-4,0,9,-19,0,-7],
// 4 16 -20 0 -10 -12 0 -9 4 0 9 -19 0 -7
  [4,16,-20,0,-10,-12,0,-9,4,0,9,-19,0,-7],
// 3 16 -4 0 -9 4 0 -9 12 0 9
  [3,16,-4,0,-9,4,0,-9,12,0,9],
// 3 16 -20 0 10 -12 0 9 -4 0 9
  [3,16,-20,0,10,-12,0,9,-4,0,9],
// 4 16 -20 0 10 -4 0 9 4 0 9 20 0 10
  [4,16,-20,0,10,-4,0,9,4,0,9,20,0,10],
// 3 16 4 0 9 12 0 9 20 0 10
  [3,16,4,0,9,12,0,9,20,0,10],
];
module ldraw_lib__3069bp0i(step=0, col=false, unit=2/5, alt=false, line=0.2, solid=!$preview)
    makepoly(ldraw_lib__3069bp0i(solid), step=step, col=col, unit=unit, alt=alt, line=line, solid=solid);
ldraw_lib__3069bp0i(line=0.2);
